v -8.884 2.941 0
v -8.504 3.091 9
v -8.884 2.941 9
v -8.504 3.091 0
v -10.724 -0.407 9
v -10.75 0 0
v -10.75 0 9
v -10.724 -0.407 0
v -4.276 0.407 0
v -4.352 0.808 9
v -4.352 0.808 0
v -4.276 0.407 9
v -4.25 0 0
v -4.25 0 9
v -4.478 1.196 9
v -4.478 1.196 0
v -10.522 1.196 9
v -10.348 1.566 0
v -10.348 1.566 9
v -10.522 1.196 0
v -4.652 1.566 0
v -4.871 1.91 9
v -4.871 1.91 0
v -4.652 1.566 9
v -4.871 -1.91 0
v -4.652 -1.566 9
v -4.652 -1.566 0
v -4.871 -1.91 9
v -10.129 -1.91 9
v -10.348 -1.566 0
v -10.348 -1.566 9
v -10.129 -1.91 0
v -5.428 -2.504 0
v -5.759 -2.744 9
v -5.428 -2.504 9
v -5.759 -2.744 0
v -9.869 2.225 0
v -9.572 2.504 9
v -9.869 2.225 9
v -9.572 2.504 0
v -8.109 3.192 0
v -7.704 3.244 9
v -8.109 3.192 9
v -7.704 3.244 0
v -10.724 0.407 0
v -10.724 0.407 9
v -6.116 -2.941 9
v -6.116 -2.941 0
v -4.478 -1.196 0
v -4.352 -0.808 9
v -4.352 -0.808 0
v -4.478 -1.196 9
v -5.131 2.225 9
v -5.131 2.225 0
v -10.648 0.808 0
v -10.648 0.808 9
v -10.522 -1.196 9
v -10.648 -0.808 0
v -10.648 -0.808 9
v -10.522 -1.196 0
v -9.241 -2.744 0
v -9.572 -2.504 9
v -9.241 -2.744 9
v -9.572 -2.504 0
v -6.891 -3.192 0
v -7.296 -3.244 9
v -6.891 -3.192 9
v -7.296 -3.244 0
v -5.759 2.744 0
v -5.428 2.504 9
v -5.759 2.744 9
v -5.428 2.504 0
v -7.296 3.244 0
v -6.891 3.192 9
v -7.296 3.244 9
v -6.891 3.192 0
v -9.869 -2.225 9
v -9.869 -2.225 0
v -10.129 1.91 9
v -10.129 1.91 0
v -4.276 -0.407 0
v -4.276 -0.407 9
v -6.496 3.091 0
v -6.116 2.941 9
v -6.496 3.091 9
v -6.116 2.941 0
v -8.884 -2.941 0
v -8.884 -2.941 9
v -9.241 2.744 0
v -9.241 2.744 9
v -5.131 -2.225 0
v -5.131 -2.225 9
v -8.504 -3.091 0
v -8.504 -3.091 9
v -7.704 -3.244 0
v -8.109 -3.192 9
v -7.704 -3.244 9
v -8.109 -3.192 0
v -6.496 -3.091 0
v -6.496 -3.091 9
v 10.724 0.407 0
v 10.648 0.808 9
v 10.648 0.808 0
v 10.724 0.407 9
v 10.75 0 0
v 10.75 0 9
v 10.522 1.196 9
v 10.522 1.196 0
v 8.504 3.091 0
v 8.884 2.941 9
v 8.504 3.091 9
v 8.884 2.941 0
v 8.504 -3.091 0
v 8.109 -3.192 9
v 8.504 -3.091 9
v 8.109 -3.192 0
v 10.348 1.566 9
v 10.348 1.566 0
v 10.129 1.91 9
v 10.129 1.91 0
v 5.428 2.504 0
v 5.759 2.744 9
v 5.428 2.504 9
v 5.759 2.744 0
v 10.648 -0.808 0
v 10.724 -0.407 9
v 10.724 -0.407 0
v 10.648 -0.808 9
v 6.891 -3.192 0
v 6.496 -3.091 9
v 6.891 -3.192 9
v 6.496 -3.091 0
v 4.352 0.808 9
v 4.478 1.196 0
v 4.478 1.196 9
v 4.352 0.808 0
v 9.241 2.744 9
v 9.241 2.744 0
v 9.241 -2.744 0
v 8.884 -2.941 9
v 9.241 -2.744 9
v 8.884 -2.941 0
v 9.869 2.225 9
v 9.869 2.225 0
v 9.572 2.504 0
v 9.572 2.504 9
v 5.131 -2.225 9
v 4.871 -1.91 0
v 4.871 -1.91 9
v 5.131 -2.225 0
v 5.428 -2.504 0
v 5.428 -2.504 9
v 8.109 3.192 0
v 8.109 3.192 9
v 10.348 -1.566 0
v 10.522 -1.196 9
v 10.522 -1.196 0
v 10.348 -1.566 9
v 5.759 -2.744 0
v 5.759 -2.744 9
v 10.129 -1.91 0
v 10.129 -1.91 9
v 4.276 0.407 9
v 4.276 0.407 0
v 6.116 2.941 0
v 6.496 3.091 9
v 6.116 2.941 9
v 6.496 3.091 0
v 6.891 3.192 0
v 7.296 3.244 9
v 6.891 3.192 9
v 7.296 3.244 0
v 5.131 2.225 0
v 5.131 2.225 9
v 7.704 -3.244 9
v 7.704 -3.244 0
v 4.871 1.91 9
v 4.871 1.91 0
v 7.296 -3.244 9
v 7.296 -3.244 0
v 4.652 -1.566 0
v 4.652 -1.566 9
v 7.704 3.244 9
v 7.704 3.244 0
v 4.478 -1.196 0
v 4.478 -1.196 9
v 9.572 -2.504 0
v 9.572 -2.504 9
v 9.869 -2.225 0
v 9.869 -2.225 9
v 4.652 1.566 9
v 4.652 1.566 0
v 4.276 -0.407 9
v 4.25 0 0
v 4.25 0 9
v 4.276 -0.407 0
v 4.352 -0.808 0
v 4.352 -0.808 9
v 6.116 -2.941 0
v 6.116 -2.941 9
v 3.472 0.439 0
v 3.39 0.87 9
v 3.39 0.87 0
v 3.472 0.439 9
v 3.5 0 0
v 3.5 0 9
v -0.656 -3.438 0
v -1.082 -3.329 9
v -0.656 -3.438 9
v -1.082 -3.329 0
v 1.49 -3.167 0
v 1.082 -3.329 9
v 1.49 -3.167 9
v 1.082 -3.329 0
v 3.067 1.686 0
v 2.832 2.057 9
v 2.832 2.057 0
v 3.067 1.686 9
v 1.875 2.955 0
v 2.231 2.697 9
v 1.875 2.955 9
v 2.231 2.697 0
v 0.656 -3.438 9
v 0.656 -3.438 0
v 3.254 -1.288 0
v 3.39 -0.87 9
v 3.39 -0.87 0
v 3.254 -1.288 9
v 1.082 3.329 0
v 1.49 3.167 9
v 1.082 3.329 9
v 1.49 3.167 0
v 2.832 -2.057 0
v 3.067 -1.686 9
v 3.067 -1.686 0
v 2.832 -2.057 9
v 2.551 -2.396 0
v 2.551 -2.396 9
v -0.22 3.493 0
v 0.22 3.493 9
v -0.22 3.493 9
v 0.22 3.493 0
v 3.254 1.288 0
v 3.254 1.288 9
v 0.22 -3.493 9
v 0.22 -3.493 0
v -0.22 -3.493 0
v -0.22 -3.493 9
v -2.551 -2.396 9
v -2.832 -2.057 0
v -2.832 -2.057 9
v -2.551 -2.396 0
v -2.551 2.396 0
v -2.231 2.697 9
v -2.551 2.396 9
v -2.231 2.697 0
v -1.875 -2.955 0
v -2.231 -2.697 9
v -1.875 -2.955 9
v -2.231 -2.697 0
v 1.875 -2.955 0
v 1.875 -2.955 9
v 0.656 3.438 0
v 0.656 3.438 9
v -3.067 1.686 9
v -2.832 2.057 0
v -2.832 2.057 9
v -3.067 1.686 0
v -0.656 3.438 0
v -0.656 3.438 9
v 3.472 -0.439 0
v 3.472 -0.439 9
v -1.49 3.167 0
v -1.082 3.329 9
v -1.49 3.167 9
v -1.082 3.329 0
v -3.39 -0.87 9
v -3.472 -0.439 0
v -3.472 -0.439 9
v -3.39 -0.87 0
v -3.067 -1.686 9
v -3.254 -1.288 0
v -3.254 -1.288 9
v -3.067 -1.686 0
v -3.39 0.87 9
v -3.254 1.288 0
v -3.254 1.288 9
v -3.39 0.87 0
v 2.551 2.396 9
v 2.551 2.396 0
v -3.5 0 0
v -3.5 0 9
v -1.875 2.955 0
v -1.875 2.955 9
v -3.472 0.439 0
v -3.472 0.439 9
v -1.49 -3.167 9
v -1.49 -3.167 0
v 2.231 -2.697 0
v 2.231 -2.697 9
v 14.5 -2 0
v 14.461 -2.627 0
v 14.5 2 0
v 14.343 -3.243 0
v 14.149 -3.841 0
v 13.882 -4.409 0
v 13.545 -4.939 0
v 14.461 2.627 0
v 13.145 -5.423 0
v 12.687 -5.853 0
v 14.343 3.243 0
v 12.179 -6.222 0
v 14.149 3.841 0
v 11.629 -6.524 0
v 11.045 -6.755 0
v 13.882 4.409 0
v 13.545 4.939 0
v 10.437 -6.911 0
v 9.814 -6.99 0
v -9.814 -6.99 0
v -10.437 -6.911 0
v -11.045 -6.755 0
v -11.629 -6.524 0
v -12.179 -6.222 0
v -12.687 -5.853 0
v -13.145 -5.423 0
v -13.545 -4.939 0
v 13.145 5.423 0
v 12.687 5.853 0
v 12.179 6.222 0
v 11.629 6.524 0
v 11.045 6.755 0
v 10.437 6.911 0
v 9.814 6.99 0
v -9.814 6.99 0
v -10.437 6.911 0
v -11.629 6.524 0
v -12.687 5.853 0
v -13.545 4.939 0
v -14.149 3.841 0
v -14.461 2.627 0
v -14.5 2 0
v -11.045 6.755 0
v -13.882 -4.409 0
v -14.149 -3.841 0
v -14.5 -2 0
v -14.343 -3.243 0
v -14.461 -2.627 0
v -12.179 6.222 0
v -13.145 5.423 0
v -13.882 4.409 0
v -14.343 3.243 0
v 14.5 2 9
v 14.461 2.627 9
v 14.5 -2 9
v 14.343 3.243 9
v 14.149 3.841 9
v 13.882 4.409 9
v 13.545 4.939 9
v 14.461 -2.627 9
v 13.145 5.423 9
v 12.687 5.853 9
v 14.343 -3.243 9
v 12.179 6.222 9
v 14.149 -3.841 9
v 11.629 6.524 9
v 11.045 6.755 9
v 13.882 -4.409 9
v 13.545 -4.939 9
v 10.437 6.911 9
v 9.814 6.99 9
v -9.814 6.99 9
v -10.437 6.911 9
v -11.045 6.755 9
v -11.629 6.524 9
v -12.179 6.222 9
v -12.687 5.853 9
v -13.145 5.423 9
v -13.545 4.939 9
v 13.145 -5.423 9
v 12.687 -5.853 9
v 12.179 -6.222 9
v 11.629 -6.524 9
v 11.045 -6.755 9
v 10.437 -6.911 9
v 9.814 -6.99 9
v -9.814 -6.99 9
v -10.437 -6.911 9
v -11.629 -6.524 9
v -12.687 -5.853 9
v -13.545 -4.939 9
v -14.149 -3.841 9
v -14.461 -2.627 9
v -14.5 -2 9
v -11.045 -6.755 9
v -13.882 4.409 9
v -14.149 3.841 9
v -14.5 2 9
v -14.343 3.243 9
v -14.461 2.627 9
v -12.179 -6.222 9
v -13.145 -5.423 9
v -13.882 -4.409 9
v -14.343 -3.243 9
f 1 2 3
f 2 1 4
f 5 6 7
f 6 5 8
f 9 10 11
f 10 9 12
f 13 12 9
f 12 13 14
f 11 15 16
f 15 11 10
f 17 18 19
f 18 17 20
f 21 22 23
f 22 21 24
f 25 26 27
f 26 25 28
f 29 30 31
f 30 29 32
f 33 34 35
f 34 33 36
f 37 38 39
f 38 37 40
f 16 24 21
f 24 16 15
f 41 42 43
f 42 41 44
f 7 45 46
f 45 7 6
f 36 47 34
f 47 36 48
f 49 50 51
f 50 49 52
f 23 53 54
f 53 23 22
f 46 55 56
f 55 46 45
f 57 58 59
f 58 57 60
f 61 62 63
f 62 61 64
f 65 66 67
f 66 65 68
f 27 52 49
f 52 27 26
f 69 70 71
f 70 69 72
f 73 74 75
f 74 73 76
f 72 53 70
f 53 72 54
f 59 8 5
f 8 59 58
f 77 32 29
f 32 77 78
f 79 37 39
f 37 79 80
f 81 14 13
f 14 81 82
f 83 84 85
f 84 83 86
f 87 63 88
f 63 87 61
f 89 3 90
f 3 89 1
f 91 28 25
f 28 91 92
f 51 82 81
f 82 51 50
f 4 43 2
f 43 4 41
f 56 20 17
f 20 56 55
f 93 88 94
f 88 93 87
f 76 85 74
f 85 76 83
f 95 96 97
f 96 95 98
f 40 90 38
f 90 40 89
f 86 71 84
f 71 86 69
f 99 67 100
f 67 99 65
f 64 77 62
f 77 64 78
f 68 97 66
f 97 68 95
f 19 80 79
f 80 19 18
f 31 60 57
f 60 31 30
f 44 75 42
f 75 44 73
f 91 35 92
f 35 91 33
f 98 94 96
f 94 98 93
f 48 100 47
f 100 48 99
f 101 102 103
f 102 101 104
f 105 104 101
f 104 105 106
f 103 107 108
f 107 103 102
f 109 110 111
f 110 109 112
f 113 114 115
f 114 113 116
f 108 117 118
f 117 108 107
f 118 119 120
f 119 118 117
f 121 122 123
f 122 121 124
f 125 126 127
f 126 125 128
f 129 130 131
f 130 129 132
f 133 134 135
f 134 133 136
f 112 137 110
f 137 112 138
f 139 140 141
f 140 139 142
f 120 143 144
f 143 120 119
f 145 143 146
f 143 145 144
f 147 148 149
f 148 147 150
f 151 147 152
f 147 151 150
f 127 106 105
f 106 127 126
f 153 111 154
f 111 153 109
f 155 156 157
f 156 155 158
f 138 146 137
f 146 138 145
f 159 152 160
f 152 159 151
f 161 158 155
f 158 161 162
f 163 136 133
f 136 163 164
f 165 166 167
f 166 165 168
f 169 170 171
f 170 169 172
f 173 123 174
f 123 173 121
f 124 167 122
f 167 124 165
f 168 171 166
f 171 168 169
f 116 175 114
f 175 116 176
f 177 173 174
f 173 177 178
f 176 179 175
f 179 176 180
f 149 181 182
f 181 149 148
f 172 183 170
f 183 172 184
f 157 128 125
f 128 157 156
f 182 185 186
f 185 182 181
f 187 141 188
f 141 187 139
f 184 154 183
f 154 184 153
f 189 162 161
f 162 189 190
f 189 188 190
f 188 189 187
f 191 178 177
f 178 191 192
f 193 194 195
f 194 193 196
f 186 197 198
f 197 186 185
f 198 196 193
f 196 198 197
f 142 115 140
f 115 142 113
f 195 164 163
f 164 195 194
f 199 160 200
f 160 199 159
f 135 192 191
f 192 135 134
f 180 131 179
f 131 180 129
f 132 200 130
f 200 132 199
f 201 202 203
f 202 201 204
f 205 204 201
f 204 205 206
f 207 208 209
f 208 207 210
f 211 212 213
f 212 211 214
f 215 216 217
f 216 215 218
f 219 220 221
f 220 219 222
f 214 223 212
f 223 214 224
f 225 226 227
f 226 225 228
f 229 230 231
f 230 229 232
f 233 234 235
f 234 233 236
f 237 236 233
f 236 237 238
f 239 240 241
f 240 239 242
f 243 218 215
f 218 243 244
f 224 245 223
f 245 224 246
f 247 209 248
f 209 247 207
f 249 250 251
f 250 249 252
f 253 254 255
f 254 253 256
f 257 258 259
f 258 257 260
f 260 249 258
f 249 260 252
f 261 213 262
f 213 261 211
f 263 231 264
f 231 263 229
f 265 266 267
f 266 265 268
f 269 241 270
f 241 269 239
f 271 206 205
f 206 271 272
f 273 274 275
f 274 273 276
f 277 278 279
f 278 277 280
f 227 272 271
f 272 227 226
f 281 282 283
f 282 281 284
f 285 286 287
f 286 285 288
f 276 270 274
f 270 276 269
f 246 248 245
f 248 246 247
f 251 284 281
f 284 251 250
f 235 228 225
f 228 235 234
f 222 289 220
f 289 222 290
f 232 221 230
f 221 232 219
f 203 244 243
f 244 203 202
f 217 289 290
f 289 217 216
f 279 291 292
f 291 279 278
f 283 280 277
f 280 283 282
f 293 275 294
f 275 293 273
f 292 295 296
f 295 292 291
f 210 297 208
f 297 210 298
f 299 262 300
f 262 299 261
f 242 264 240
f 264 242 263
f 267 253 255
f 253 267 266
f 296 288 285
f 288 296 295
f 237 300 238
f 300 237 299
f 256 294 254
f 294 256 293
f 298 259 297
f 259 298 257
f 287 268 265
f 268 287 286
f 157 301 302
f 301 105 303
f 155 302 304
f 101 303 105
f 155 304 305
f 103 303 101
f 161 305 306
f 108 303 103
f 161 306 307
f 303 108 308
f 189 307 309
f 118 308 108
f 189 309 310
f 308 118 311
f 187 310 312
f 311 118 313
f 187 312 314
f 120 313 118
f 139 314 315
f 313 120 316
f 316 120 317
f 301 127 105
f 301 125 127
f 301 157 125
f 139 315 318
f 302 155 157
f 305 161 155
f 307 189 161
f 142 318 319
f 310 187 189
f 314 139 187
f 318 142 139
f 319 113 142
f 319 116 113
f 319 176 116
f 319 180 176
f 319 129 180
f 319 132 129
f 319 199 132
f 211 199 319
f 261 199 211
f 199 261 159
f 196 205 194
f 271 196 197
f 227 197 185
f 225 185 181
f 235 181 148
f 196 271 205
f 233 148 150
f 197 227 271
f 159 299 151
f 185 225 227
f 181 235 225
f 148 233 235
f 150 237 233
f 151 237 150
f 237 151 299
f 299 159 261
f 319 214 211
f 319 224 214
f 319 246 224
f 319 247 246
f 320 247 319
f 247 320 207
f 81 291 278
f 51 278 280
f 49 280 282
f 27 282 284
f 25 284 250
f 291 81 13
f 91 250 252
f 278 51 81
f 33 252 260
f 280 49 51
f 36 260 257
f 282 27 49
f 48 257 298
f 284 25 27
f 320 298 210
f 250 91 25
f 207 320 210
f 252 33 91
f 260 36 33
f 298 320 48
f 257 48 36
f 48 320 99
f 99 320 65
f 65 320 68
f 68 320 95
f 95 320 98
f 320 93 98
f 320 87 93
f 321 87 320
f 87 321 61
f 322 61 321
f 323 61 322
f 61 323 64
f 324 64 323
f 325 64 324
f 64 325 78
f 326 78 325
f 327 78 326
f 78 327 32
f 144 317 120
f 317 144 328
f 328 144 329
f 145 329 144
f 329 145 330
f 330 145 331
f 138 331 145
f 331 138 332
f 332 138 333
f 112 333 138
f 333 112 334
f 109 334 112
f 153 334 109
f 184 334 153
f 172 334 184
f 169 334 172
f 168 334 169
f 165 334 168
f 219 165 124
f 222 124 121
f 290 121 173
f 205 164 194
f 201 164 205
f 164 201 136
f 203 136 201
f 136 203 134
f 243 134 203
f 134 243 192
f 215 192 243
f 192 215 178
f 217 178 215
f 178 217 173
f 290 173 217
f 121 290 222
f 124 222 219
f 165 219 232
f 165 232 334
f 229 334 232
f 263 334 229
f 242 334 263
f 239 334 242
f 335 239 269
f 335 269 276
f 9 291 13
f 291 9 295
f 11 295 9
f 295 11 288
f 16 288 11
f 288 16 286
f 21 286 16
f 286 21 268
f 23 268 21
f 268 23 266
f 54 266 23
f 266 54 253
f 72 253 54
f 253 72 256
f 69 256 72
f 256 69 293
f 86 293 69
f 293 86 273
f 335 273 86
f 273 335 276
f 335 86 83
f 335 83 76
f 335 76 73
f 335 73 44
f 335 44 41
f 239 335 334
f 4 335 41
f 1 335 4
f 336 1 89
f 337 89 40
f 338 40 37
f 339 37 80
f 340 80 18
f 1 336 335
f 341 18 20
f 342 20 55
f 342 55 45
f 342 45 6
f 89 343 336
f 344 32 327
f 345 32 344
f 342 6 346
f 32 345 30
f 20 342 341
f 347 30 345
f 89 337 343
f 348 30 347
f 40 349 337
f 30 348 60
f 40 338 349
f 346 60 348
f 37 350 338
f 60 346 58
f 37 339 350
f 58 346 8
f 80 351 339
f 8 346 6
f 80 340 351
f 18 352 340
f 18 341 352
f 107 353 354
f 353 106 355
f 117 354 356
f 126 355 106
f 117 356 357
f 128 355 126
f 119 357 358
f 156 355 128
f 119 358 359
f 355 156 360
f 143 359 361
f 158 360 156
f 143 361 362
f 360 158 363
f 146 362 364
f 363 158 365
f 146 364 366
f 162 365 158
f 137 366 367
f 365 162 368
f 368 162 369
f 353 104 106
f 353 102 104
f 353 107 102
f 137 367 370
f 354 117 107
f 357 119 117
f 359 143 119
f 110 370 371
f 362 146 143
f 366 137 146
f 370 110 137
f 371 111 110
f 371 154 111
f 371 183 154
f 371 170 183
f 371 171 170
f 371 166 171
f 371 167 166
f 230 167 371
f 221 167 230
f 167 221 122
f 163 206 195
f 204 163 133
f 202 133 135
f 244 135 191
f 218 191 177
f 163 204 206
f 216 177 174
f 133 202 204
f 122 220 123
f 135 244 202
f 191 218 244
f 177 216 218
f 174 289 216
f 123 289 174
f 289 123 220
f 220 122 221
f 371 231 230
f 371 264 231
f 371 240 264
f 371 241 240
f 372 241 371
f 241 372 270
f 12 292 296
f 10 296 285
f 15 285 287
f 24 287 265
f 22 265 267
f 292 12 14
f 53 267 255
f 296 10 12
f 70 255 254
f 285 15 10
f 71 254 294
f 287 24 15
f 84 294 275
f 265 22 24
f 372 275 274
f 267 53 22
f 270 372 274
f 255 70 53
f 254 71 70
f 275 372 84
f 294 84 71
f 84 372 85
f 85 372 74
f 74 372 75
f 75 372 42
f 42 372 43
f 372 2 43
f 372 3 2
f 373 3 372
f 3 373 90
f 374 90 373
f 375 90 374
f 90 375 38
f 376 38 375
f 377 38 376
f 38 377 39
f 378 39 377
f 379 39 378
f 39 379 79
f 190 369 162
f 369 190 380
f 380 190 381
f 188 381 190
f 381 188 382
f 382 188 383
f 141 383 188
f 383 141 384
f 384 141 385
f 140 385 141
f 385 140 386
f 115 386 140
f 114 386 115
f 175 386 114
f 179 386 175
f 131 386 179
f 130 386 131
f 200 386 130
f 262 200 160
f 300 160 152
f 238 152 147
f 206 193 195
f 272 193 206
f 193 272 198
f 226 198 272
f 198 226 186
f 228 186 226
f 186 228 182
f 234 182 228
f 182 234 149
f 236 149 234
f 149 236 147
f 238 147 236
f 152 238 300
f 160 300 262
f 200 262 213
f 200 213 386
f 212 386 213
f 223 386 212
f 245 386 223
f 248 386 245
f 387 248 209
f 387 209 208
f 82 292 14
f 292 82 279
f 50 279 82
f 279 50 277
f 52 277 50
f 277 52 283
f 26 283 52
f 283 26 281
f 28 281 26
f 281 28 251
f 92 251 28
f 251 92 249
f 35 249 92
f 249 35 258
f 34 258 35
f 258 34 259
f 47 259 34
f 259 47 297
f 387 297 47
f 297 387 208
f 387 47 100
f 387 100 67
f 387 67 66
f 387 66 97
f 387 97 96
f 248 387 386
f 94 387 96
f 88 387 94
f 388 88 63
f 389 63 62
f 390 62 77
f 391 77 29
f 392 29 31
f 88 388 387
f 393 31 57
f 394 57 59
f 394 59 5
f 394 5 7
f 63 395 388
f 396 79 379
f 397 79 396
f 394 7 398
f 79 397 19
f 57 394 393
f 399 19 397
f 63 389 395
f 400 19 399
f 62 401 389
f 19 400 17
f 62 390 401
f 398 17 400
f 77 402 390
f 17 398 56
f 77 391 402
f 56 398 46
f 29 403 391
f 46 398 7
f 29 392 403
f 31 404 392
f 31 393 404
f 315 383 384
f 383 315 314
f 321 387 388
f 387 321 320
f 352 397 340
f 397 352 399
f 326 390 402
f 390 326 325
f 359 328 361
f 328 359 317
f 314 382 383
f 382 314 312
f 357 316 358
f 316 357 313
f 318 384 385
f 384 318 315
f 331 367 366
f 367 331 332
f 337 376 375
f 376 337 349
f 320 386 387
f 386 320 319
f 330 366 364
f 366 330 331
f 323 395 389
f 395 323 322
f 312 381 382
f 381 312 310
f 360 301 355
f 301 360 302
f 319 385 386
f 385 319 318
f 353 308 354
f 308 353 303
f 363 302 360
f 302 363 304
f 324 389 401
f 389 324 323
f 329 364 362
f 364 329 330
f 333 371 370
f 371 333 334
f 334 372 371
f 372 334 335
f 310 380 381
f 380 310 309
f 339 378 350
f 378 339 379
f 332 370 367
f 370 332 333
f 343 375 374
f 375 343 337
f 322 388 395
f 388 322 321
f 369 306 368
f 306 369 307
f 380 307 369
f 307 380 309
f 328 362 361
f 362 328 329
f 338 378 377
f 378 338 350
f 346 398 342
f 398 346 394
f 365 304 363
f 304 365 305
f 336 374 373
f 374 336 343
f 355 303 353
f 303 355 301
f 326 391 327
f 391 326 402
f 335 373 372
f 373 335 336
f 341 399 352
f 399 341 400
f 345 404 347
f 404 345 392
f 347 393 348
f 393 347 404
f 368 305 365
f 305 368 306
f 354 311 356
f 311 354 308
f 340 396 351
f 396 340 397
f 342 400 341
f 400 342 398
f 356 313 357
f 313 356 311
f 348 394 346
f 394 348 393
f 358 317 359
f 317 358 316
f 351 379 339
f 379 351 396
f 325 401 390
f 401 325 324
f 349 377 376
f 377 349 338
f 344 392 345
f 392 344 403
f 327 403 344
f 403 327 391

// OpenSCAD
$fn = 50;


difference() {
	union() {
		hull() {
			translate(v = [-9.5000000000, 2.0000000000, 0]) {
				cylinder(h = 9, r = 5);
			}
			translate(v = [9.5000000000, 2.0000000000, 0]) {
				cylinder(h = 9, r = 5);
			}
			translate(v = [-9.5000000000, -2.0000000000, 0]) {
				cylinder(h = 9, r = 5);
			}
			translate(v = [9.5000000000, -2.0000000000, 0]) {
				cylinder(h = 9, r = 5);
			}
		}
	}
	union() {
		#translate(v = [-7.5000000000, 0.0000000000, 0]) {
			cylinder(h = 9, r = 3.2500000000);
		}
		#translate(v = [7.5000000000, 0.0000000000, 0]) {
			cylinder(h = 9, r = 3.2500000000);
		}
		#translate(v = [-7.5000000000, 0.0000000000, -100.0000000000]) {
			cylinder(h = 200, r = 3.2500000000);
		}
		#translate(v = [-7.5000000000, 0.0000000000, -100.0000000000]) {
			cylinder(h = 200, r = 3.2500000000);
		}
		#translate(v = [7.5000000000, 0.0000000000, -100.0000000000]) {
			cylinder(h = 200, r = 3.2500000000);
		}
		#translate(v = [7.5000000000, 0.0000000000, -100.0000000000]) {
			cylinder(h = 200, r = 3.2500000000);
		}
		#translate(v = [-7.5000000000, 0.0000000000, 0]) {
			cylinder(h = 9, r = 1.8000000000);
		}
		#translate(v = [7.5000000000, 0.0000000000, 0]) {
			cylinder(h = 9, r = 1.8000000000);
		}
		#translate(v = [-7.5000000000, 0.0000000000, 0]) {
			cylinder(h = 9, r = 1.8000000000);
		}
		#translate(v = [7.5000000000, 0.0000000000, 0]) {
			cylinder(h = 9, r = 1.8000000000);
		}
		#translate(v = [-7.5000000000, 0.0000000000, 0]) {
			cylinder(h = 9, r = 1.8000000000);
		}
		#translate(v = [7.5000000000, 0.0000000000, 0]) {
			cylinder(h = 9, r = 1.8000000000);
		}
		#cylinder(h = 9, r = 3.5000000000);
	}
}
